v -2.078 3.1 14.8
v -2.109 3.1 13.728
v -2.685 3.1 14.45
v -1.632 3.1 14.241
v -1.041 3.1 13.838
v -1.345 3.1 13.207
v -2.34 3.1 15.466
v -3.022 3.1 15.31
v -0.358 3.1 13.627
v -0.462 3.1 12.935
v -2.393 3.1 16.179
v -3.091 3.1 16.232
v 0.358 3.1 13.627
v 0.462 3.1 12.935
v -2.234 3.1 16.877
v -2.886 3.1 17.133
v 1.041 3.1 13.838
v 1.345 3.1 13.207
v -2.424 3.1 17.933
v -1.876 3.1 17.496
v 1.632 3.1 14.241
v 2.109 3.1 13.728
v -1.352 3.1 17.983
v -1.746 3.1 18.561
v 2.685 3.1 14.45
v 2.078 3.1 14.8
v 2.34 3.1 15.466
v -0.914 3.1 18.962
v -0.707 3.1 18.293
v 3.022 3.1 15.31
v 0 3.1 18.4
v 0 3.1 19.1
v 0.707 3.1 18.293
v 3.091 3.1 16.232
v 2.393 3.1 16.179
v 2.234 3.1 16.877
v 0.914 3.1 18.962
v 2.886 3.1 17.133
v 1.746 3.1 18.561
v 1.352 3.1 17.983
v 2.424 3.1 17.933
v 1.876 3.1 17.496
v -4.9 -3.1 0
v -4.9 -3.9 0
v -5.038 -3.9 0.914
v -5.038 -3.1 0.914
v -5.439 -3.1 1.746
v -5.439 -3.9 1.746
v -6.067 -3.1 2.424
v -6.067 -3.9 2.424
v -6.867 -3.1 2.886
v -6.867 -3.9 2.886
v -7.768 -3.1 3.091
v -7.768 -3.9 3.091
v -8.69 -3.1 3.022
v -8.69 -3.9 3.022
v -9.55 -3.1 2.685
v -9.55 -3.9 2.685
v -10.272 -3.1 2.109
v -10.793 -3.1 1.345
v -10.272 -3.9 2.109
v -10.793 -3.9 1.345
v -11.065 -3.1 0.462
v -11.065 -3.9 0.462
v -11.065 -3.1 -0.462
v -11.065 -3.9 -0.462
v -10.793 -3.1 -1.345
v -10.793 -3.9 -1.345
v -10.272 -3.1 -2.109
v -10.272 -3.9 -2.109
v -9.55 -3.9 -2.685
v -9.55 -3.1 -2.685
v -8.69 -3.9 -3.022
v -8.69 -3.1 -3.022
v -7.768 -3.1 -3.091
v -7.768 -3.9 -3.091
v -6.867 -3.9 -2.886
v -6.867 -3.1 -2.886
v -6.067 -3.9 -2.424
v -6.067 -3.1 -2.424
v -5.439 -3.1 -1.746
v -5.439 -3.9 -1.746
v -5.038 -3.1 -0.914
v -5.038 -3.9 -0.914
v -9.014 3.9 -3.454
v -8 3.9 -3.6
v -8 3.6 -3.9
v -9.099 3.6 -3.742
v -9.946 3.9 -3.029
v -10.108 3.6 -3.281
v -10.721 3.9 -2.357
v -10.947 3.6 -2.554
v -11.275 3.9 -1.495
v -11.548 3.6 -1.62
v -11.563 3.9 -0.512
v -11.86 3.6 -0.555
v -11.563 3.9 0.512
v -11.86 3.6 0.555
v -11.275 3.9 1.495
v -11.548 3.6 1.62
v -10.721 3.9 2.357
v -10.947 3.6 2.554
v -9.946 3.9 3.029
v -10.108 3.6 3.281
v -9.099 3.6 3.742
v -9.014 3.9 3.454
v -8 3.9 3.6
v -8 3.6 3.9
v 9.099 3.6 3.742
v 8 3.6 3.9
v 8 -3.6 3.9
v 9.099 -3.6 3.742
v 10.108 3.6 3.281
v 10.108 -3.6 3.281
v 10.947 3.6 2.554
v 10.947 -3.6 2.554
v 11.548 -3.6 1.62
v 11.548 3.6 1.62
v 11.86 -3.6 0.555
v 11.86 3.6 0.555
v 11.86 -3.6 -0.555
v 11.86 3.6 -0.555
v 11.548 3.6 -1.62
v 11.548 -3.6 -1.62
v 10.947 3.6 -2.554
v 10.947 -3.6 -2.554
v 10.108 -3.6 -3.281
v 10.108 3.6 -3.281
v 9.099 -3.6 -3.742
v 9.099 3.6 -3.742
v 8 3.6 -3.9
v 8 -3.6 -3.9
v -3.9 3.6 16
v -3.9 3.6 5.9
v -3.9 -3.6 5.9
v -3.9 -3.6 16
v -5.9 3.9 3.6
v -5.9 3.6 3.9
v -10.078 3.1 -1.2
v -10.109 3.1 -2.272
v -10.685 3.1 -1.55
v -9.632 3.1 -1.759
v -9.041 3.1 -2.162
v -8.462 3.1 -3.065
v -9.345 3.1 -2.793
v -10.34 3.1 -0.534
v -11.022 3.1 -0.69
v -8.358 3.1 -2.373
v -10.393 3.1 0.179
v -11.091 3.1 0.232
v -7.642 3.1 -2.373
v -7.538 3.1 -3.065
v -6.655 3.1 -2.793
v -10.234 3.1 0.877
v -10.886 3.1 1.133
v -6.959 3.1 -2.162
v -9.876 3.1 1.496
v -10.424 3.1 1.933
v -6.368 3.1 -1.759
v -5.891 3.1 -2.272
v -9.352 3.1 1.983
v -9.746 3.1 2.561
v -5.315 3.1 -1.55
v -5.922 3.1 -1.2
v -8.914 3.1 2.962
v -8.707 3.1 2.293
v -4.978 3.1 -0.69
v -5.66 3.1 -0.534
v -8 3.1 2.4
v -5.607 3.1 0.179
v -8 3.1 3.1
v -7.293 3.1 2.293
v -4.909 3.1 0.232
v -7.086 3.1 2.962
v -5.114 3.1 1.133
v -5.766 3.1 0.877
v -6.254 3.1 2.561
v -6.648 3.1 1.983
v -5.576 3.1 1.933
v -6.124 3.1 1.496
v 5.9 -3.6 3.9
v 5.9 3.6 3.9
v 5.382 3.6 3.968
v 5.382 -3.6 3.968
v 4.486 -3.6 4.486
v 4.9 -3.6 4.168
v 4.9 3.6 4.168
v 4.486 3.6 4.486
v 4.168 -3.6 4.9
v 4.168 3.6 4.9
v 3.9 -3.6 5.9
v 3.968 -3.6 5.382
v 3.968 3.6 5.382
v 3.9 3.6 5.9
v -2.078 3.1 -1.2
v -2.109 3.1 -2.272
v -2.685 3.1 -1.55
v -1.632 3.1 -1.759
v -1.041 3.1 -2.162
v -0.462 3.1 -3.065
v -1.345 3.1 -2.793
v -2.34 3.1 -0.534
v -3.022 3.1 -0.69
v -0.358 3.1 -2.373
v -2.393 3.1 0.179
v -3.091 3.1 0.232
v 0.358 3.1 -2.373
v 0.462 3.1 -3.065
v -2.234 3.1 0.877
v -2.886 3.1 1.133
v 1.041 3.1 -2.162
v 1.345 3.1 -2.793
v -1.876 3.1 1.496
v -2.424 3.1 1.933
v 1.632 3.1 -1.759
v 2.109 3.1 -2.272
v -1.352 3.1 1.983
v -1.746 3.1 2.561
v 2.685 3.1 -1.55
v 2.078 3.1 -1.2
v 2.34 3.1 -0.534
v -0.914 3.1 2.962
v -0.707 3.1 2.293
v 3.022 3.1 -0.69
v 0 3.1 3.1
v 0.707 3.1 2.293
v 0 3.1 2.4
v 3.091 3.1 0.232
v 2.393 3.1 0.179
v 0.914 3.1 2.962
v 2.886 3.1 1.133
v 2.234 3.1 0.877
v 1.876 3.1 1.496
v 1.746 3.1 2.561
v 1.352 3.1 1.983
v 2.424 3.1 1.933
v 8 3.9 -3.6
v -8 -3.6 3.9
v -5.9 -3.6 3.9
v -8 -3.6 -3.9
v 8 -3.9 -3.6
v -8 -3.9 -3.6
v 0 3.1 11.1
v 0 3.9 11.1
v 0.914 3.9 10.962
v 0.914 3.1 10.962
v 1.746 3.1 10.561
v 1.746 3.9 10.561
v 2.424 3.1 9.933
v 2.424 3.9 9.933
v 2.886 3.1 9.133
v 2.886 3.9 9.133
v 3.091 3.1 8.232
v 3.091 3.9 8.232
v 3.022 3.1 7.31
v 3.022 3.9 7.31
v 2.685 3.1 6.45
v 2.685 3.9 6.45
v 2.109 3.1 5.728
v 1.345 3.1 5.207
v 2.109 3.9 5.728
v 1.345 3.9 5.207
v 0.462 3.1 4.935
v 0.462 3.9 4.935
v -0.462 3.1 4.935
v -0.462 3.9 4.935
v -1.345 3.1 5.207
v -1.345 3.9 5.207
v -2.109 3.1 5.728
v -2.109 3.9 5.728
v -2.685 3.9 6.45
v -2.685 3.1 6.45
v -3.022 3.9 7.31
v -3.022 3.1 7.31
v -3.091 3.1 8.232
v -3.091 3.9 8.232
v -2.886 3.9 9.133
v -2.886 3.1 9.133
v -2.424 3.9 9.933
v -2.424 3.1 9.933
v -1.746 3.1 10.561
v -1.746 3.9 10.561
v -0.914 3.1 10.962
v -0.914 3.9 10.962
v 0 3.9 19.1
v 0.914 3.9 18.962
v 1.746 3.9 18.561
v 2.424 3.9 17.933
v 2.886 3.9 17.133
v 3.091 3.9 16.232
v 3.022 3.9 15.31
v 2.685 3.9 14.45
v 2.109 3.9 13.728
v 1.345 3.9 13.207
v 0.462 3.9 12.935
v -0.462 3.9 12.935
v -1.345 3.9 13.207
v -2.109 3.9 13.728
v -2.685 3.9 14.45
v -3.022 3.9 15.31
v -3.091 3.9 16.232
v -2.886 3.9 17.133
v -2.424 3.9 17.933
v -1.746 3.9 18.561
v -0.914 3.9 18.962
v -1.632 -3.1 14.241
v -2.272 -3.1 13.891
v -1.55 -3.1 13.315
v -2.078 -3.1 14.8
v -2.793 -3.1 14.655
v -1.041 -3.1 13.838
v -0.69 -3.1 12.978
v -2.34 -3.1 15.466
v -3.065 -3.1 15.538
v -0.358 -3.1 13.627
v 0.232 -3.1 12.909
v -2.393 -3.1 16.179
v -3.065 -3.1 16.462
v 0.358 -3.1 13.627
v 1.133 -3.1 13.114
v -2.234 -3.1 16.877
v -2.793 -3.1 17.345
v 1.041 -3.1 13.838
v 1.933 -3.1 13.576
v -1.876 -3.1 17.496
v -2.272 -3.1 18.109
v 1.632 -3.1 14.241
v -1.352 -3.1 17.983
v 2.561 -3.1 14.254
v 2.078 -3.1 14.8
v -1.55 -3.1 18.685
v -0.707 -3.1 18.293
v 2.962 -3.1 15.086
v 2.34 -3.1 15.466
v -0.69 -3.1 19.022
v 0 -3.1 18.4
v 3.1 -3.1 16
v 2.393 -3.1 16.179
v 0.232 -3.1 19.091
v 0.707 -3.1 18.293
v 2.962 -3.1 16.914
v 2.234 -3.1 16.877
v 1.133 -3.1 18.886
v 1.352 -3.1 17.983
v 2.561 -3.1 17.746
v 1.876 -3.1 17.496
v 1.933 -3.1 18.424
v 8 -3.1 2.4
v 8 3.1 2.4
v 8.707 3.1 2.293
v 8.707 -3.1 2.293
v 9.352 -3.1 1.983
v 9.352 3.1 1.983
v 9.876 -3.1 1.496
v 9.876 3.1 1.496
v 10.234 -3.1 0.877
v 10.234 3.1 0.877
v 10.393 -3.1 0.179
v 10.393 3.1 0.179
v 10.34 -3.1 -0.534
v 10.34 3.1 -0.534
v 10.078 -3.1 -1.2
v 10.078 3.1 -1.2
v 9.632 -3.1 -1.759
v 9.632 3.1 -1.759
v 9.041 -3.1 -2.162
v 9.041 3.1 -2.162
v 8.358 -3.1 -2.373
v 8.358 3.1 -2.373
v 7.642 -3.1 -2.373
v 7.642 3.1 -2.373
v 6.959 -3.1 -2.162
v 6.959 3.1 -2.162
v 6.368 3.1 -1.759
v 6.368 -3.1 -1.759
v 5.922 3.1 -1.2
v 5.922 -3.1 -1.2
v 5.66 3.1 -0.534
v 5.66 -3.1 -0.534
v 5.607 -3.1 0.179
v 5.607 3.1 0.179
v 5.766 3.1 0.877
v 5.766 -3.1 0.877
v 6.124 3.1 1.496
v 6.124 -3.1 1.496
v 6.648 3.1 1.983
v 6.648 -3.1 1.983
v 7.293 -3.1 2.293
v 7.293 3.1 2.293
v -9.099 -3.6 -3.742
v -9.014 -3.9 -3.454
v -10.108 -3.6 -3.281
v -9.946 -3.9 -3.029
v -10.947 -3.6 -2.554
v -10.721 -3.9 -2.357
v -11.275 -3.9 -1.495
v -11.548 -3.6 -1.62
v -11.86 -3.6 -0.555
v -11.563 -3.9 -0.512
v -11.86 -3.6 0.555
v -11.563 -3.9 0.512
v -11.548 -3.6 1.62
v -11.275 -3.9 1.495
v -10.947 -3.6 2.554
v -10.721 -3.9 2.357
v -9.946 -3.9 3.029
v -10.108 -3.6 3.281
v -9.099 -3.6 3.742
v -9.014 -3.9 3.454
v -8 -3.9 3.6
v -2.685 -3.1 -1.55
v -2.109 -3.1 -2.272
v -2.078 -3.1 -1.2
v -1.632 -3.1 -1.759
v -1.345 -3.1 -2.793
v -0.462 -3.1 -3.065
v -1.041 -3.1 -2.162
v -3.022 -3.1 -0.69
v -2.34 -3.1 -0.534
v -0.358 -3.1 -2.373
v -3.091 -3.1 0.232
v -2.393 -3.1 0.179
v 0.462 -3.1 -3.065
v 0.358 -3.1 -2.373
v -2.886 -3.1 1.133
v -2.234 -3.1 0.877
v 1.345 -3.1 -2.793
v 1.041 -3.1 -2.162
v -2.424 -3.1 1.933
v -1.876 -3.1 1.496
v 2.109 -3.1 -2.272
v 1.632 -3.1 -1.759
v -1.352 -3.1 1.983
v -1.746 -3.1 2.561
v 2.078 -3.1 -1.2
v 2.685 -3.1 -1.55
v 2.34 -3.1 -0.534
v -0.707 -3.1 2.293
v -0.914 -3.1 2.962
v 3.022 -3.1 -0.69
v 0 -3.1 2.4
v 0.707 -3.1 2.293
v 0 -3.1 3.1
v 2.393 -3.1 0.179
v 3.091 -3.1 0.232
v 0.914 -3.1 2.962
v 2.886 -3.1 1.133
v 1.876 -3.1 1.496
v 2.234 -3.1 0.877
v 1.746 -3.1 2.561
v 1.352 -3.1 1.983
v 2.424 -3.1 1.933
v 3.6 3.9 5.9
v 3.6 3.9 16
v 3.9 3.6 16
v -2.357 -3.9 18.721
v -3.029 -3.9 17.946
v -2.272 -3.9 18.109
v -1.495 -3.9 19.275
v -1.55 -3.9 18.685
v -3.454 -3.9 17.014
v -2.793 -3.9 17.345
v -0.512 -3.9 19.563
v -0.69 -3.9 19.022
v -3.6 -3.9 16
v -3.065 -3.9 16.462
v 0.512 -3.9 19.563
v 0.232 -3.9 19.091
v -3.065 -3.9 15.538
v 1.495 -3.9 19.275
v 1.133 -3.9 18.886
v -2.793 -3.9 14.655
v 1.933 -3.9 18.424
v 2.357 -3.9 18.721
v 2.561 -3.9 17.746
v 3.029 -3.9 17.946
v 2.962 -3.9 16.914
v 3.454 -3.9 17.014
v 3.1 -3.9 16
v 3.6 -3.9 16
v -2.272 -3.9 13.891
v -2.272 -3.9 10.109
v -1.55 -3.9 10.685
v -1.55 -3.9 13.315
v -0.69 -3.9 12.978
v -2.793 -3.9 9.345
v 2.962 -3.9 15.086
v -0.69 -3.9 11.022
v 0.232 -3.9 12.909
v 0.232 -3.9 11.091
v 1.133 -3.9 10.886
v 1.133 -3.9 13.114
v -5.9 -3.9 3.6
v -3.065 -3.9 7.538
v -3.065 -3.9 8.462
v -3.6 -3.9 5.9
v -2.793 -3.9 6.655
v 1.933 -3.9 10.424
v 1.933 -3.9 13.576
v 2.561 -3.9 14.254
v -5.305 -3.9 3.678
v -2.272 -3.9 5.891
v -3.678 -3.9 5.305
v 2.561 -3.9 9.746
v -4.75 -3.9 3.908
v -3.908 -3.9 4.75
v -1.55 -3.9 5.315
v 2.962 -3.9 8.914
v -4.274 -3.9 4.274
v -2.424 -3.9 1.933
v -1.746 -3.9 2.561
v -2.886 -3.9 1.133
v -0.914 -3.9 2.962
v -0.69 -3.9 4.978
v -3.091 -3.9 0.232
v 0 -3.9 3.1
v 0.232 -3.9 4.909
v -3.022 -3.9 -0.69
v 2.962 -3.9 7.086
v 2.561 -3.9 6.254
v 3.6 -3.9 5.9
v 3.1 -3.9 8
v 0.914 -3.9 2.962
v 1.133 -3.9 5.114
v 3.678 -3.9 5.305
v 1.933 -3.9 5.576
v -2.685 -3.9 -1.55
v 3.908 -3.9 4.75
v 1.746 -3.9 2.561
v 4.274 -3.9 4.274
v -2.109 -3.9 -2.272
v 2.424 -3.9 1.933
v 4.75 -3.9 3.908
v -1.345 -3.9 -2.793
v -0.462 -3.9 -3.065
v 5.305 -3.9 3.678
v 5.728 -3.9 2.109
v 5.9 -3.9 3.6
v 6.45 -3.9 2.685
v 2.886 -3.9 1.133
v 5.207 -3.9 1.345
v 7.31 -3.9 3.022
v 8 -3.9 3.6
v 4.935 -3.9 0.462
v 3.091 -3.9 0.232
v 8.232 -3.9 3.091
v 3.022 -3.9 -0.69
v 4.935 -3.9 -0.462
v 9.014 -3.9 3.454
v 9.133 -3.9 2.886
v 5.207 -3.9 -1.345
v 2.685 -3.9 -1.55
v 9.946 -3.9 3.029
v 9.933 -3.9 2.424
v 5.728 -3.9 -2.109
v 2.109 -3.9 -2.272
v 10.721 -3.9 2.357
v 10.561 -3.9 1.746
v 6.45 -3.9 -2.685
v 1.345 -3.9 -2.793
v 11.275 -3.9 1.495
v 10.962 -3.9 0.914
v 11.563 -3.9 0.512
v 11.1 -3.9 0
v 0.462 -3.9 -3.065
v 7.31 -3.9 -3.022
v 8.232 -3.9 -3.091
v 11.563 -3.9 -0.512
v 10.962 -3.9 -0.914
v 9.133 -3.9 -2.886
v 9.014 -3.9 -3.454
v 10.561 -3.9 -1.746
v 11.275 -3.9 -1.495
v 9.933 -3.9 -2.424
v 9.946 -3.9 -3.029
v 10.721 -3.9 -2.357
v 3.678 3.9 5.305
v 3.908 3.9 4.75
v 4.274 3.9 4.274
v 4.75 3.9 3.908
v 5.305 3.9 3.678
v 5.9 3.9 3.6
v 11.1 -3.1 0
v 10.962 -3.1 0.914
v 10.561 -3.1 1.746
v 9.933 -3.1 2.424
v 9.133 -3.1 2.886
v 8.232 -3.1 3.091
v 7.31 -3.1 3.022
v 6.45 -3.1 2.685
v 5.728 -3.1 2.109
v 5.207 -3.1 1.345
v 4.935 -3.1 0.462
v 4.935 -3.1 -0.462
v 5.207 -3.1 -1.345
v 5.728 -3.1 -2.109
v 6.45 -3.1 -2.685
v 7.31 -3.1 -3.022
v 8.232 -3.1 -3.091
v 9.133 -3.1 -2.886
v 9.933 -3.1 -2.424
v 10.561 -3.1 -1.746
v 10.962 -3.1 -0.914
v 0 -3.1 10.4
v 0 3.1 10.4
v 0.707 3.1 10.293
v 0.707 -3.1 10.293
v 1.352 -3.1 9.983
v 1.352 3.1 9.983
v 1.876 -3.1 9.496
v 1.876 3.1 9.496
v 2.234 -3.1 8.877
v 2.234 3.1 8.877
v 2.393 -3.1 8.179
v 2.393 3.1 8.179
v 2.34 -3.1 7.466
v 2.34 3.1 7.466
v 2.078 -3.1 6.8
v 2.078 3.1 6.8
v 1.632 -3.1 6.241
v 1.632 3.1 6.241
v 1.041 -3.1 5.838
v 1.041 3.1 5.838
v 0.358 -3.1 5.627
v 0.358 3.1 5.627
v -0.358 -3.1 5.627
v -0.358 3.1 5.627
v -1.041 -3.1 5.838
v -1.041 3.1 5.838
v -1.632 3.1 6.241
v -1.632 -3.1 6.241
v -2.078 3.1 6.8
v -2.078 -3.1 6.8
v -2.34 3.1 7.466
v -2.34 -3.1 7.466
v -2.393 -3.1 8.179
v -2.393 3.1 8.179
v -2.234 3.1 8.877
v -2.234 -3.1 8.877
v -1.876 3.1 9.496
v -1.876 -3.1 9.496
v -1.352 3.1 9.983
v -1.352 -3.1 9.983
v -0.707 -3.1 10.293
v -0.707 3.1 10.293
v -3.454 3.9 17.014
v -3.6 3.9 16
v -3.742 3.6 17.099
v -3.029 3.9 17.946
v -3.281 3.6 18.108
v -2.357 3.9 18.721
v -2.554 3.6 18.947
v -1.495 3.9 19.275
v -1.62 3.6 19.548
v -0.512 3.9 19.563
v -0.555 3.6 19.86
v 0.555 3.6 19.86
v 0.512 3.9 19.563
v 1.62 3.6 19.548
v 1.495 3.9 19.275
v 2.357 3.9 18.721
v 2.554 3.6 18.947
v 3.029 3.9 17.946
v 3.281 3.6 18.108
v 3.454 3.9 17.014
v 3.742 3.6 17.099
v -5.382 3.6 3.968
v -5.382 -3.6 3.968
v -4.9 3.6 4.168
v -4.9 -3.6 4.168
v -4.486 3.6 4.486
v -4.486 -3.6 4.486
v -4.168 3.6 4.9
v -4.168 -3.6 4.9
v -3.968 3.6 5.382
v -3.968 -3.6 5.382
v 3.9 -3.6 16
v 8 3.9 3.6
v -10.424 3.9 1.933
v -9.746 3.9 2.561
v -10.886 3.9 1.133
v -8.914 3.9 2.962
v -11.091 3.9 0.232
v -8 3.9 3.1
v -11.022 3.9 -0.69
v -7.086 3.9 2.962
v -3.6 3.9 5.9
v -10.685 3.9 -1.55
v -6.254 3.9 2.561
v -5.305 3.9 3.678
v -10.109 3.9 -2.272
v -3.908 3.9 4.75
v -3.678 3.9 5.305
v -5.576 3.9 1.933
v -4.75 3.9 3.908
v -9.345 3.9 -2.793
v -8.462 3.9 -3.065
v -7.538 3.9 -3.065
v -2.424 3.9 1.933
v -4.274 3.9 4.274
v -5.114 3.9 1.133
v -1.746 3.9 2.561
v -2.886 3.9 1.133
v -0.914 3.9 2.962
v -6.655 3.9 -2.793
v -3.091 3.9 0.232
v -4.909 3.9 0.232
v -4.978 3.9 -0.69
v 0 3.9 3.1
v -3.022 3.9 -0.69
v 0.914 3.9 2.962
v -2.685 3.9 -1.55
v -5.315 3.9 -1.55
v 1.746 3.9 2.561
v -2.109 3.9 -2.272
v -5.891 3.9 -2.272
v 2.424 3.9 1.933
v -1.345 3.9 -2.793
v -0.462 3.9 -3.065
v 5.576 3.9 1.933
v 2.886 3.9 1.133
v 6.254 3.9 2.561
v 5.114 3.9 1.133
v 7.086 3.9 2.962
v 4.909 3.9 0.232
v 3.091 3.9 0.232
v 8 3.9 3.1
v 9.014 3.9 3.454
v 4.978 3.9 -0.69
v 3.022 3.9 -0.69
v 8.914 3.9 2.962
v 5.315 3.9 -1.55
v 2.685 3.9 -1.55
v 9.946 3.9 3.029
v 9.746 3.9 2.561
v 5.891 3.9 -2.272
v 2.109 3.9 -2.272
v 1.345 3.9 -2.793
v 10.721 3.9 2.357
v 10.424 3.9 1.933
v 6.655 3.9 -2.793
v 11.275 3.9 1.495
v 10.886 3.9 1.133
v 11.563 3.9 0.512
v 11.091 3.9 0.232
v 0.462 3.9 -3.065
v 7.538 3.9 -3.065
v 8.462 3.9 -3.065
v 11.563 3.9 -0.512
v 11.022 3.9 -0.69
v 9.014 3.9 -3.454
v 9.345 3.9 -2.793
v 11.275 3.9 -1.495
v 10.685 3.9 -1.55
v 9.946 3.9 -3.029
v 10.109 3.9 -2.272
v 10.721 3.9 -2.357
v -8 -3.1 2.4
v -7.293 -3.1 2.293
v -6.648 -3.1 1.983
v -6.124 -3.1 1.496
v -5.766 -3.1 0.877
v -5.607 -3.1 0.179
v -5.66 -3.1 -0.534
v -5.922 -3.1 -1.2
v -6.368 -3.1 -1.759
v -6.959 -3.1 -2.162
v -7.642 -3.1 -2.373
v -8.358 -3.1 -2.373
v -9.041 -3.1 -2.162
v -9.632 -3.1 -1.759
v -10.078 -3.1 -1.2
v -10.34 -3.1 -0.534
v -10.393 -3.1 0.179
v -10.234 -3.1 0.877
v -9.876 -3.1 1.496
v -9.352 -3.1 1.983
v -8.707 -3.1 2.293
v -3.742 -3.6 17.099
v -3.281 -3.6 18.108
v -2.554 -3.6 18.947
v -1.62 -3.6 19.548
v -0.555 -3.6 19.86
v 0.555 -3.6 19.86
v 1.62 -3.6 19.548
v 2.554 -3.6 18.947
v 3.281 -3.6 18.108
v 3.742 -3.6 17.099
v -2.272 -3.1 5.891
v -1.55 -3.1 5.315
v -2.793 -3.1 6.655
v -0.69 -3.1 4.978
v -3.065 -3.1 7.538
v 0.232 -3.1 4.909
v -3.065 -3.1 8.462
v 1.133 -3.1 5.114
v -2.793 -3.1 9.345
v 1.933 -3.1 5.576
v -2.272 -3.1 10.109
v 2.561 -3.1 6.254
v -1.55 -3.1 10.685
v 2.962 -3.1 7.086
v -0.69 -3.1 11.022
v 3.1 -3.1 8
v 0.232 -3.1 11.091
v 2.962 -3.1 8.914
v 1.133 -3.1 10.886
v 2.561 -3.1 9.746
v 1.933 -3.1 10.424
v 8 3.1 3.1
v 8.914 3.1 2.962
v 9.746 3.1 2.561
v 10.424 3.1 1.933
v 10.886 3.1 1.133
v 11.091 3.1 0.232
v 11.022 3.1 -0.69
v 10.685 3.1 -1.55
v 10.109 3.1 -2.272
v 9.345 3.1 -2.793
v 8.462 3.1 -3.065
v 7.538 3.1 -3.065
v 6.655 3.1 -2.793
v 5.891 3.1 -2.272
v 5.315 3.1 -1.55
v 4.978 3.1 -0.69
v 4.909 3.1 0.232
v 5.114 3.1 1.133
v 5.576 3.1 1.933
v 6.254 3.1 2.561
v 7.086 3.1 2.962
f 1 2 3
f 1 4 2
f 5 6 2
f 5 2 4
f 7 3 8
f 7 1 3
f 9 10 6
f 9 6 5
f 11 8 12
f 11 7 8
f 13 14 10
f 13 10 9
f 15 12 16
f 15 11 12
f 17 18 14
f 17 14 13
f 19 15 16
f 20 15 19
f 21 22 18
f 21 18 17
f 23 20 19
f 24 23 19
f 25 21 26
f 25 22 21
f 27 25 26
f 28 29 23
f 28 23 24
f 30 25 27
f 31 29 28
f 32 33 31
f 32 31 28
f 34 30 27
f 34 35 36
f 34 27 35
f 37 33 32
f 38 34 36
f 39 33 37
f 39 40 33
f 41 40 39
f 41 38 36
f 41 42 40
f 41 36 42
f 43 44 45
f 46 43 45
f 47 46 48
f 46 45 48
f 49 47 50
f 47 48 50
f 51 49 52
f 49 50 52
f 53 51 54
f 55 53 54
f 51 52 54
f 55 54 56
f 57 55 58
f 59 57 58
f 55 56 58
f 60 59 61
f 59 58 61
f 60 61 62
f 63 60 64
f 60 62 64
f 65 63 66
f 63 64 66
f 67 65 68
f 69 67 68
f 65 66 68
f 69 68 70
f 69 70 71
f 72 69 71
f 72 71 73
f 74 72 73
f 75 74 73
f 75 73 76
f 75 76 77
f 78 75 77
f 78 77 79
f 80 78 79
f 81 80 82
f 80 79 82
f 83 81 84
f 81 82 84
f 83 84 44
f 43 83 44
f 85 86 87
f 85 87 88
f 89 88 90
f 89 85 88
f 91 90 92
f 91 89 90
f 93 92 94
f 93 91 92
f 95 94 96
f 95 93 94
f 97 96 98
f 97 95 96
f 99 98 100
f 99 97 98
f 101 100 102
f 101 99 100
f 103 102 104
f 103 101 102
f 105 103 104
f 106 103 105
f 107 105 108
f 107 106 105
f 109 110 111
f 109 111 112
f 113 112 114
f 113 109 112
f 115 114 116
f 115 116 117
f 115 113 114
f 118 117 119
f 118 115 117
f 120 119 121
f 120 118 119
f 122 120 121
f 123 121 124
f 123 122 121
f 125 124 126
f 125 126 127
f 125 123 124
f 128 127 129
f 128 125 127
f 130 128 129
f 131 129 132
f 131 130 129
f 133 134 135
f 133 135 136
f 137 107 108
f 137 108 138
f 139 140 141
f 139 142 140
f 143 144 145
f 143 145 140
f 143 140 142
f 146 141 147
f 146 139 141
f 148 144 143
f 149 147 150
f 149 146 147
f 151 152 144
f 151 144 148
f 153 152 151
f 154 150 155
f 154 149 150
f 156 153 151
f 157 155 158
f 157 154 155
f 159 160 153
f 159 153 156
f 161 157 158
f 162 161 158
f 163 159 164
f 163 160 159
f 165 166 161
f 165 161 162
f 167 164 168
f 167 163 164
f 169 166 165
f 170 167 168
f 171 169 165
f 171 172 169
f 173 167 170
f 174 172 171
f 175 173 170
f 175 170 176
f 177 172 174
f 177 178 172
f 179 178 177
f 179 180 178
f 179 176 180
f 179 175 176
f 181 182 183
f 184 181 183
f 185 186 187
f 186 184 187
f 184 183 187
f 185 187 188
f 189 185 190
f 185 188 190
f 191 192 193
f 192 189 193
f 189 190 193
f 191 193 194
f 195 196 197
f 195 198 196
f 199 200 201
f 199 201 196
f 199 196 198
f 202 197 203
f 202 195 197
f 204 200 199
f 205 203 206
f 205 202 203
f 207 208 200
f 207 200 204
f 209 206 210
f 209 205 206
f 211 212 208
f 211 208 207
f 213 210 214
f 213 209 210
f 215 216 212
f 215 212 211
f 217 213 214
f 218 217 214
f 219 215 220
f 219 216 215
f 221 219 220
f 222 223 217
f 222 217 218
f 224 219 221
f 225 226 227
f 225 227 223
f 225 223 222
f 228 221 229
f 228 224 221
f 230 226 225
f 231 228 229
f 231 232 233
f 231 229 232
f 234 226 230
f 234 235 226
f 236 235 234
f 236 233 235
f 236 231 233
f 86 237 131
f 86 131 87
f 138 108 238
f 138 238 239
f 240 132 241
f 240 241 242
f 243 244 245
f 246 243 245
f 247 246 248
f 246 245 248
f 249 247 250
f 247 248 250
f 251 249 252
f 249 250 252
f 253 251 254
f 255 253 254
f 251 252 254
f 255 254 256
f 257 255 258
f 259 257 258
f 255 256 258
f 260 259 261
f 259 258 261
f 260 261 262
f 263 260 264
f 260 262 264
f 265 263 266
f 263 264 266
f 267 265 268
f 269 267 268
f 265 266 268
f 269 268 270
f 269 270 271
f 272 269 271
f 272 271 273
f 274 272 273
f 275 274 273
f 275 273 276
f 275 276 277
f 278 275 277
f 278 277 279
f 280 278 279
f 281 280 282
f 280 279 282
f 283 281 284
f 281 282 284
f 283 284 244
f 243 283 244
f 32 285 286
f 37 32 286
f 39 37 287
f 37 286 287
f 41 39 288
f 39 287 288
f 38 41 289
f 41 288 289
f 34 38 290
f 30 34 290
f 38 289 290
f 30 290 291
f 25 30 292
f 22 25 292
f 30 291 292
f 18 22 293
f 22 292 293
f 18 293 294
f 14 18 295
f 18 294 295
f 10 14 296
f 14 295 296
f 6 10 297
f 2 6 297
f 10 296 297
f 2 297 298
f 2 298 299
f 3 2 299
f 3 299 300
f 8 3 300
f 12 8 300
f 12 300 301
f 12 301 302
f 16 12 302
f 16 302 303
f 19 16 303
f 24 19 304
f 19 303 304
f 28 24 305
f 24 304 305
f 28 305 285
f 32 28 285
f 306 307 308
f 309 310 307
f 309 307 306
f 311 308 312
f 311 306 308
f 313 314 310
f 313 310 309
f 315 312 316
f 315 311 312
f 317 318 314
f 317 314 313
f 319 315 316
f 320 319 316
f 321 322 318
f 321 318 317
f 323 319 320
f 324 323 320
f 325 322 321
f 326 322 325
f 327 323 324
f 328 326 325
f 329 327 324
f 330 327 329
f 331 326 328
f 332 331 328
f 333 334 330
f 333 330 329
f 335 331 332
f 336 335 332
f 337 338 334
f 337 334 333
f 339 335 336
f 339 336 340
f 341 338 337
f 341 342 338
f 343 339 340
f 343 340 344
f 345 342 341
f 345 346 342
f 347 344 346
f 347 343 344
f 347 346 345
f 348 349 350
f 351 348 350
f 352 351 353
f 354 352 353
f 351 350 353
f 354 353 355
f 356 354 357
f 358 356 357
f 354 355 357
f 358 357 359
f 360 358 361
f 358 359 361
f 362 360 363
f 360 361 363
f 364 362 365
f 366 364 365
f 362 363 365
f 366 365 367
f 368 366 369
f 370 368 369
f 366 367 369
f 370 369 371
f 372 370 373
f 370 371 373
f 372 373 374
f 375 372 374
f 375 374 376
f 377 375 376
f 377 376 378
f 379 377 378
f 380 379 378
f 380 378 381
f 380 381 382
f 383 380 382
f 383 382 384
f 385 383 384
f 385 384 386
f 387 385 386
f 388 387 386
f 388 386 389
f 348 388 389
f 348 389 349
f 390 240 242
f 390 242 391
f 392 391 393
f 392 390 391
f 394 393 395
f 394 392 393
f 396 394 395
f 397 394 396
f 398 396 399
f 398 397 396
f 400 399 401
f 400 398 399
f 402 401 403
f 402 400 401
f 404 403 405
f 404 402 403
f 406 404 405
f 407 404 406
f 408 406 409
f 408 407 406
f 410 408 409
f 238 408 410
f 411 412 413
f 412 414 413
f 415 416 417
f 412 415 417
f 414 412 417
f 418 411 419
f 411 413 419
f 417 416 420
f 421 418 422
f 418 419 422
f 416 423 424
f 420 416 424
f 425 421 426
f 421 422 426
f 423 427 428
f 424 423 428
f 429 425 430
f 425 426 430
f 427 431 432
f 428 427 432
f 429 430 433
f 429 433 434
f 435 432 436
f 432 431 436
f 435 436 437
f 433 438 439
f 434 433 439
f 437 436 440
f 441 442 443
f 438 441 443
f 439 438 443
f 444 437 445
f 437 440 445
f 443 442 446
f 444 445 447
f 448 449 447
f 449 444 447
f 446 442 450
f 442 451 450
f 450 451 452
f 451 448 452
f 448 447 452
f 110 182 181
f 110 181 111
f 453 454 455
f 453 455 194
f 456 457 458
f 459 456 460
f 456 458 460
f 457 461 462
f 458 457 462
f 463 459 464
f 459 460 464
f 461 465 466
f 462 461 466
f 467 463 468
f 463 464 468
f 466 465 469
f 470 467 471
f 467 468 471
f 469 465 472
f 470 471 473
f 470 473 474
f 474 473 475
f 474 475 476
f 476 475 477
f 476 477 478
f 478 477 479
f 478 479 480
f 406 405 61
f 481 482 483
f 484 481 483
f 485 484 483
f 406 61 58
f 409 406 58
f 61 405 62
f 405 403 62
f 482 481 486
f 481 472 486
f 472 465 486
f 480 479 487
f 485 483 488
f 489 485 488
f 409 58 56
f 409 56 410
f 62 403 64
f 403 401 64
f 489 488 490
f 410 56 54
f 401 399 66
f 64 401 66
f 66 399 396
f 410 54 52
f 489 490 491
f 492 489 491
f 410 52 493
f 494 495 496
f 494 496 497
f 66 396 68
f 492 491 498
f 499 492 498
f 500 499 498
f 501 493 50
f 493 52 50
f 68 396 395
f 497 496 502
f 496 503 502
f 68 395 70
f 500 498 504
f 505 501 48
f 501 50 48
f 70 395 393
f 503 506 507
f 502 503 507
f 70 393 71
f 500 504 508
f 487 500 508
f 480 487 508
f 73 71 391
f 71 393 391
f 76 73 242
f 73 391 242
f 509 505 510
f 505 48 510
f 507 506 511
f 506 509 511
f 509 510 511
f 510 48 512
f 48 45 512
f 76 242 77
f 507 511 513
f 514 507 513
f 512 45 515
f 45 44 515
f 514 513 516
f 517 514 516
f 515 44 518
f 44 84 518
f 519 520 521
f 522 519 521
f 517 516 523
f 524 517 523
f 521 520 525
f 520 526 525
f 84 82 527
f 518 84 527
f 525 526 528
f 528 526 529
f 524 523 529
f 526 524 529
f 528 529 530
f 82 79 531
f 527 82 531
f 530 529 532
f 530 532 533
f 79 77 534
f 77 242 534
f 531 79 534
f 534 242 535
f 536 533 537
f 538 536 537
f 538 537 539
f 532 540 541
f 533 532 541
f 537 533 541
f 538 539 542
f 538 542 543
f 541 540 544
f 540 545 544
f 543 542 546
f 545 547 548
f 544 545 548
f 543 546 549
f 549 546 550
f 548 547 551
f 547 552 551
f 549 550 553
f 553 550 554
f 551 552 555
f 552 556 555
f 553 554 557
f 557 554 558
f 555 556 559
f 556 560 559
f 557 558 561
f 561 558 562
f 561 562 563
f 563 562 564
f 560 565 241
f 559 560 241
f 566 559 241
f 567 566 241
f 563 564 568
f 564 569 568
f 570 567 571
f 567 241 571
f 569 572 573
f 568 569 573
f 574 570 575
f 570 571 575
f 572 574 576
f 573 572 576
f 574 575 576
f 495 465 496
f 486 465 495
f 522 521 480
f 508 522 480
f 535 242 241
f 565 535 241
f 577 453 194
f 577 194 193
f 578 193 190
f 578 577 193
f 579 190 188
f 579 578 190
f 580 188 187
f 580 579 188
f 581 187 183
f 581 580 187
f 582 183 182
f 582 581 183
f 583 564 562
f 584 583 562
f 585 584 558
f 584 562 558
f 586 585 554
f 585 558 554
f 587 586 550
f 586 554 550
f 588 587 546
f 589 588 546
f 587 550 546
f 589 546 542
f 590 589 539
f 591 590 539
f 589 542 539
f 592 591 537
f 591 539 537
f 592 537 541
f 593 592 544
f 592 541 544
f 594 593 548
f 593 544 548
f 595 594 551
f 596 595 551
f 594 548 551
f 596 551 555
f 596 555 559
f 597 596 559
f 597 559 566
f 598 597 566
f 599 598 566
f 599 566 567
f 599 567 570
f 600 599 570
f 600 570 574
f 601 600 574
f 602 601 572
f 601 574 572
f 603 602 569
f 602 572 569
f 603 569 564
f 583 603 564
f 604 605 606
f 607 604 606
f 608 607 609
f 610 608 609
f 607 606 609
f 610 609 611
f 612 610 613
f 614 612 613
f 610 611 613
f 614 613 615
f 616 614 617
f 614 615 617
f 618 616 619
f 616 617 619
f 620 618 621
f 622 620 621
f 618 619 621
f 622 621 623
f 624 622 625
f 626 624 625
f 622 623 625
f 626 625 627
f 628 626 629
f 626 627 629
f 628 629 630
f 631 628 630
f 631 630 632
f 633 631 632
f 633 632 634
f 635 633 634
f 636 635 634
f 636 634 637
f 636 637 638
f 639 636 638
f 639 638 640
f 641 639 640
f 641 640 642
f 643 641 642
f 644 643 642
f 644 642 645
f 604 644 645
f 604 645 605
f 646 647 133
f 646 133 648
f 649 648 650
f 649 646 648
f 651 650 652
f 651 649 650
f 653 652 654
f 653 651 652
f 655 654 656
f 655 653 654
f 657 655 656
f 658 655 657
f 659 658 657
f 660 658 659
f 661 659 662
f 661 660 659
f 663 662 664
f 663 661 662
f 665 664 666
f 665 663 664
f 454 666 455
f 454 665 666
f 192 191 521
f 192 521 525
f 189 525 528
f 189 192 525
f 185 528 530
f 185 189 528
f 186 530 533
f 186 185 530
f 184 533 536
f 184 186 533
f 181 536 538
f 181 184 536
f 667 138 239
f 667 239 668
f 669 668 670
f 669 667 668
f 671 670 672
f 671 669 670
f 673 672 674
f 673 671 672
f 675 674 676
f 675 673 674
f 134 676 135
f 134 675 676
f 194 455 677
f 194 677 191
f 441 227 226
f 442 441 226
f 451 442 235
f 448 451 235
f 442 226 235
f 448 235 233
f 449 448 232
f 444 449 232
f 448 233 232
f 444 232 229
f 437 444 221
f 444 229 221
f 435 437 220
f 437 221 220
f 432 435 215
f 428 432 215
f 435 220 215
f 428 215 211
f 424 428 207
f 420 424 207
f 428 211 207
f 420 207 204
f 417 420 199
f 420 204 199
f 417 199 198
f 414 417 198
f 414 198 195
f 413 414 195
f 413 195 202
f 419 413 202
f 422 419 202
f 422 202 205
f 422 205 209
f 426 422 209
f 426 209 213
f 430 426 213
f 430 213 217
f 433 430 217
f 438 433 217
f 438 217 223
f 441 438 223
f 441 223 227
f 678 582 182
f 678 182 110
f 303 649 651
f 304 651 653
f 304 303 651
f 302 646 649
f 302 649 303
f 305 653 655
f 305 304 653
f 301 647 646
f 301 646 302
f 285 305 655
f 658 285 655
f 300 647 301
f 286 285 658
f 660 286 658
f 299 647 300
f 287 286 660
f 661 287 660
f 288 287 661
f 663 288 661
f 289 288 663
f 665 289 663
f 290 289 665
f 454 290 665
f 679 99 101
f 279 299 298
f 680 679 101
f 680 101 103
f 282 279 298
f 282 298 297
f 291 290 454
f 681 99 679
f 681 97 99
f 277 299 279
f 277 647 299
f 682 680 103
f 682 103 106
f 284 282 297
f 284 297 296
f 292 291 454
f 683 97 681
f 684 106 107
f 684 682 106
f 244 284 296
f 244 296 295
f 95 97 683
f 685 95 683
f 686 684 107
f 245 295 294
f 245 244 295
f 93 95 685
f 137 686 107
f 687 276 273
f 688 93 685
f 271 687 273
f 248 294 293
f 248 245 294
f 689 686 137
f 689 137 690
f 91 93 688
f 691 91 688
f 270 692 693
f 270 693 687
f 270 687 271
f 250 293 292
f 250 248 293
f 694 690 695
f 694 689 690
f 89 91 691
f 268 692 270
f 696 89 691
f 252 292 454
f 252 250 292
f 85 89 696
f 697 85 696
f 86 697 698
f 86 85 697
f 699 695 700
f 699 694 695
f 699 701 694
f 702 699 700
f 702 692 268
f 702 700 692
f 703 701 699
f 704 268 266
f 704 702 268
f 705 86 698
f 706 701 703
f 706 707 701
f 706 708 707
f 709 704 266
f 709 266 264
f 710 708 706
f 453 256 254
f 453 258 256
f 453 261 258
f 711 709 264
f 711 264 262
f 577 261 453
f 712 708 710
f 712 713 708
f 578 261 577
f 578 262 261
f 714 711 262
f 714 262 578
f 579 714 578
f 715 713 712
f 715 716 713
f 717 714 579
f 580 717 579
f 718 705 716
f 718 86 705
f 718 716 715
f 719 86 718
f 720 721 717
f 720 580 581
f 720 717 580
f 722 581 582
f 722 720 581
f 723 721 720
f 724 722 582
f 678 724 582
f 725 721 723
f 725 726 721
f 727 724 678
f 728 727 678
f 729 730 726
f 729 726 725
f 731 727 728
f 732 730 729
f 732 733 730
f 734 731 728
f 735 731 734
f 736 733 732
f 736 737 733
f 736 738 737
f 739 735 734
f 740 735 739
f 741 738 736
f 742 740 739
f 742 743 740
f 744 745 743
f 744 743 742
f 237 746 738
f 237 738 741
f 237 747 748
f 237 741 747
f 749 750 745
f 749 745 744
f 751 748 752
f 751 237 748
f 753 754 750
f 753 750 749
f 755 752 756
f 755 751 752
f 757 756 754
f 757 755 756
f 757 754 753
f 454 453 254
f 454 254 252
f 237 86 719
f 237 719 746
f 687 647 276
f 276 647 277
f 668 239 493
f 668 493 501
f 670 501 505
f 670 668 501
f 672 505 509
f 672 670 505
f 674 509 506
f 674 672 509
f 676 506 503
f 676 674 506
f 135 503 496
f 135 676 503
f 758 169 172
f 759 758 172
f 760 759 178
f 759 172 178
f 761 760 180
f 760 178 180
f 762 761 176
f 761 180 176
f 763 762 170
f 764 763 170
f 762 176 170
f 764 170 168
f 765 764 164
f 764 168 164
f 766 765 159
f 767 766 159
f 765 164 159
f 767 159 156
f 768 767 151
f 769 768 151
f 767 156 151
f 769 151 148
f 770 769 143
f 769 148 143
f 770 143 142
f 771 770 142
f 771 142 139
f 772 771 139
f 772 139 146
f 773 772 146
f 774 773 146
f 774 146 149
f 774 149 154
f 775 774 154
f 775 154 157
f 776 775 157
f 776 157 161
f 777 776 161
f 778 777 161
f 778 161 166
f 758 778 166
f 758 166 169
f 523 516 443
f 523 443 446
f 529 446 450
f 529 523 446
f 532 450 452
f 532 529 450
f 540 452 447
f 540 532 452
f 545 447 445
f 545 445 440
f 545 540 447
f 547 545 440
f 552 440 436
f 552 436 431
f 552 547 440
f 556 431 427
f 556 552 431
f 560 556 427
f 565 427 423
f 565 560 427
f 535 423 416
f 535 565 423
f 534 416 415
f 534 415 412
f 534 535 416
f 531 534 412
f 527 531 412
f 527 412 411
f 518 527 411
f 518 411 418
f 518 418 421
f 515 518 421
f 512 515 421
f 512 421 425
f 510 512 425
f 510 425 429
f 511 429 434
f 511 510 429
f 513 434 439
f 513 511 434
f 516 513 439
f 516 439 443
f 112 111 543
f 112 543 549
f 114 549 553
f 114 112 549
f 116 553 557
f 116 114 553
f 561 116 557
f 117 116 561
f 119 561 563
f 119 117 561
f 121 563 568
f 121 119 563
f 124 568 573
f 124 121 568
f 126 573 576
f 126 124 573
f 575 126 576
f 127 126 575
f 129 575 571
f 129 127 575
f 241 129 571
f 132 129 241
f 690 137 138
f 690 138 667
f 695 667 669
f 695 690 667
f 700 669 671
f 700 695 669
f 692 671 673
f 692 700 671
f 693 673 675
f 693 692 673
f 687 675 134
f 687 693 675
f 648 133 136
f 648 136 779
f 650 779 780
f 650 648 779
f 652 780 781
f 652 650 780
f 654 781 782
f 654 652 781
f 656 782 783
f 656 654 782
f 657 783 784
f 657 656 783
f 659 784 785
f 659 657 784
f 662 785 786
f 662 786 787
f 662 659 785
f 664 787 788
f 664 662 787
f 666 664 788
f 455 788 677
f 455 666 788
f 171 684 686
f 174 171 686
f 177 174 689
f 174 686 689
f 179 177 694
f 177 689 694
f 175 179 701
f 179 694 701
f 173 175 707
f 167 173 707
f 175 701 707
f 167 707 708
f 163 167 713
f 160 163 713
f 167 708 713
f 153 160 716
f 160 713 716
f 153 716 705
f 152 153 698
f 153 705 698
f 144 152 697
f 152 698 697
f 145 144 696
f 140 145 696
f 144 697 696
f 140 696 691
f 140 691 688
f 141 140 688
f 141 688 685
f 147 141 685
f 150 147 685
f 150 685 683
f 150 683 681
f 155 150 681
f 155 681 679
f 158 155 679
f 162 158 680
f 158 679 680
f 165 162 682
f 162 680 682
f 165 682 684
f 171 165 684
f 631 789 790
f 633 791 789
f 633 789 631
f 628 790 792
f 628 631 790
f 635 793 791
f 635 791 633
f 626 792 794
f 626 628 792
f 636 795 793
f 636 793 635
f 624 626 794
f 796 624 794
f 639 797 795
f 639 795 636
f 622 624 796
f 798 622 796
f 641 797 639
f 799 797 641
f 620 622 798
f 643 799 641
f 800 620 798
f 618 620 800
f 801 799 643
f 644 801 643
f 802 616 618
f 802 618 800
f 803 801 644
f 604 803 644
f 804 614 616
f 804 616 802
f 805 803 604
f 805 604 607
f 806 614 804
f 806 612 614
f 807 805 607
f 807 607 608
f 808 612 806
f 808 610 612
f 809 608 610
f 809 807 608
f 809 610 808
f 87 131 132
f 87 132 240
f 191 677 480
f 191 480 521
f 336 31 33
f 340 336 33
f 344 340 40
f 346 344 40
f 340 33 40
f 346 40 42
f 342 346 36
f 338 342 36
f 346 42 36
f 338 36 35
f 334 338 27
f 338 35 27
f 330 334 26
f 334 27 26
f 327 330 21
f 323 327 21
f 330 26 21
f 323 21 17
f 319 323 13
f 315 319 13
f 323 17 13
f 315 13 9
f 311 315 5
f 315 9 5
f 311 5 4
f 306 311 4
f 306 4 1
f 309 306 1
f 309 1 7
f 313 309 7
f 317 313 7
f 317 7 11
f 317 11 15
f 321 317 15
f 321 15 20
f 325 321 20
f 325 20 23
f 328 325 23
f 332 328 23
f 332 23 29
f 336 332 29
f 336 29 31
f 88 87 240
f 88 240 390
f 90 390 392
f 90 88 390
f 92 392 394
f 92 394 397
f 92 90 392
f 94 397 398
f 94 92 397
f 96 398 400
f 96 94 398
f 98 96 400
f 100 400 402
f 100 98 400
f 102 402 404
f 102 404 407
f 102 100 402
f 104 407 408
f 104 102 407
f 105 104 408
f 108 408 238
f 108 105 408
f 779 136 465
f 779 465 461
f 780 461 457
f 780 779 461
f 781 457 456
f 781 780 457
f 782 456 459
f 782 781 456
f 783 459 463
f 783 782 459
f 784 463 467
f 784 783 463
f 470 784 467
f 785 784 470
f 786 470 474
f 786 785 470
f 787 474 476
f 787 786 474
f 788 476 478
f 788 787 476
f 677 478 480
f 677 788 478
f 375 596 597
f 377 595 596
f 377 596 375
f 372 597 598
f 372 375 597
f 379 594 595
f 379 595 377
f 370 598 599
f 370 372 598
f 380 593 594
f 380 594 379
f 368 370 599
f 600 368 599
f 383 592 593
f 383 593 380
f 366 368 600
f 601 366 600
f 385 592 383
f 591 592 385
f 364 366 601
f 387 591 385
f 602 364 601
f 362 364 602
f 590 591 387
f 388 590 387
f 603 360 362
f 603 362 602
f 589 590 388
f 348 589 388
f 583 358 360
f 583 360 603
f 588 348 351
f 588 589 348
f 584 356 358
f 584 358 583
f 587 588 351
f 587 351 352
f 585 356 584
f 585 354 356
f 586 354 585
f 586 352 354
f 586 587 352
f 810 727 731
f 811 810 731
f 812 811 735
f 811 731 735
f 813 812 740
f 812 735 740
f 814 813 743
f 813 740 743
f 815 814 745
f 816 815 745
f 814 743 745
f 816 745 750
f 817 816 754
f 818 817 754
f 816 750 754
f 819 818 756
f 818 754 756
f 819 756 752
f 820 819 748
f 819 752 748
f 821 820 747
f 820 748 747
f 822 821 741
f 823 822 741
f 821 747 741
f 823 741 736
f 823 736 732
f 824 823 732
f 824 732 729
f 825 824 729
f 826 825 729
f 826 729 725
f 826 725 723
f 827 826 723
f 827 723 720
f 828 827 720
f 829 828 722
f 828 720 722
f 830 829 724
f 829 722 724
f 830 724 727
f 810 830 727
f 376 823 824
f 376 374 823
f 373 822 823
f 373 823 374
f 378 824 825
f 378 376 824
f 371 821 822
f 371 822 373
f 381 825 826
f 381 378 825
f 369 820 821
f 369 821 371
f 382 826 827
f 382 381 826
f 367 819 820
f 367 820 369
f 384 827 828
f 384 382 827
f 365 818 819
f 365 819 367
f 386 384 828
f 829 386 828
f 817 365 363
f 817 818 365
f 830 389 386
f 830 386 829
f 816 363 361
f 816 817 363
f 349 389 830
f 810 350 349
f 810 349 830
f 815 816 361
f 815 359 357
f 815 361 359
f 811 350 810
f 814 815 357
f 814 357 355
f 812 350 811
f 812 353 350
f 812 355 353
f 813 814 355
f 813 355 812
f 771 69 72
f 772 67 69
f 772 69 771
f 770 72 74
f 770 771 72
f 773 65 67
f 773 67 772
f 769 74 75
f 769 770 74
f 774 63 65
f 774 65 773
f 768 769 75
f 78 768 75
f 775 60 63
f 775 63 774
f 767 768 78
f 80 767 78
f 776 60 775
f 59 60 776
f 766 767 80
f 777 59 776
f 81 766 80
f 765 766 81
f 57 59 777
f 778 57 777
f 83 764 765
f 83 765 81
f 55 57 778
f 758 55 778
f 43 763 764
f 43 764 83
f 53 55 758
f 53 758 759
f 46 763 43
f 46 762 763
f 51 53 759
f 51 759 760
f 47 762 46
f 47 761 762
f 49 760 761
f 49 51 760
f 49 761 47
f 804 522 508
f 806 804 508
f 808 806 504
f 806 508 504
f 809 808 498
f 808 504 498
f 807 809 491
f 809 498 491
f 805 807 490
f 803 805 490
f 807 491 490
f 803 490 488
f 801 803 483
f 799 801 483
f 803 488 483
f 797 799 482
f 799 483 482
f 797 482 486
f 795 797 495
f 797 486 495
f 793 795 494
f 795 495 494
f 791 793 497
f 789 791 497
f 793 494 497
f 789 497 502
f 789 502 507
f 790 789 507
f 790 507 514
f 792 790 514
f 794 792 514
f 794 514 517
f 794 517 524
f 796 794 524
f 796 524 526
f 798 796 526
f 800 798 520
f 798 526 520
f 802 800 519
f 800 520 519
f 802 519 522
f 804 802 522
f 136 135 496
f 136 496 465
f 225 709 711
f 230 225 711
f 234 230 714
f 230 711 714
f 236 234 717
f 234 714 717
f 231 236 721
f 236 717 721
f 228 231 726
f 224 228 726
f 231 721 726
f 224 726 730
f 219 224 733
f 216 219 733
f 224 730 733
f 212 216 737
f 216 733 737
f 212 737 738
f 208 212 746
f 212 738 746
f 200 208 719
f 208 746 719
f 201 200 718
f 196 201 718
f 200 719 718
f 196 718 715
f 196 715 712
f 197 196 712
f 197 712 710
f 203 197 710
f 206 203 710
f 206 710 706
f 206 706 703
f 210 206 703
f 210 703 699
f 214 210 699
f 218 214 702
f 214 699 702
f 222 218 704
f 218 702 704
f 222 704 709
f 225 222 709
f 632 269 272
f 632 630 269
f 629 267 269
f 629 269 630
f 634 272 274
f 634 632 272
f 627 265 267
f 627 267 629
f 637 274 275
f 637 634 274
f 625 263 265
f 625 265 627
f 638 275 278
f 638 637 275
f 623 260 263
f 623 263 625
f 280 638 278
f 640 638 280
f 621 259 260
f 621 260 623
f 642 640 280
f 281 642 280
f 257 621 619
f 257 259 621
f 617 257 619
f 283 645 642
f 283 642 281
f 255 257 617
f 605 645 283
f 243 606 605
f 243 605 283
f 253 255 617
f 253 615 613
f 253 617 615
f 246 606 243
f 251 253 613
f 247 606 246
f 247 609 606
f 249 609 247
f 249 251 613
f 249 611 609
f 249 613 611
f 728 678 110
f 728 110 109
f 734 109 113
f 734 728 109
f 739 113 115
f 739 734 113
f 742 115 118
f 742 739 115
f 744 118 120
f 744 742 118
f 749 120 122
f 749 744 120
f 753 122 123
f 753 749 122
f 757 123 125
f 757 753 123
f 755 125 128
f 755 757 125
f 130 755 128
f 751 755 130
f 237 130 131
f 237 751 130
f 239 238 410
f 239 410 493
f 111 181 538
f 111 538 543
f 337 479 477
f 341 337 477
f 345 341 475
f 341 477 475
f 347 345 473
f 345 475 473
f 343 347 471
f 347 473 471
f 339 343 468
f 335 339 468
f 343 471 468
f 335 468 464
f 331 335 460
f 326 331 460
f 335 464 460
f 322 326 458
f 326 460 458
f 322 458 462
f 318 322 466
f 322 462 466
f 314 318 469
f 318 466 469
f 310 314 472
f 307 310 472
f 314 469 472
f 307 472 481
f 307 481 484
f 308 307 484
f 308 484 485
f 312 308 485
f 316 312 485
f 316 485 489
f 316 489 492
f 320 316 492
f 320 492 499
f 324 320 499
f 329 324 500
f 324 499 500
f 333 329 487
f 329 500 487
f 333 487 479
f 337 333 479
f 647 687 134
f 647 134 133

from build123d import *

# Parameters (mm, degrees)
BOSS_EXTRUDE1_DEPTH           = 3.9
SKETCH2_R                     = 2.4
CUT_EXTRUDE1_DEPTH            = 25.463442113
SKETCH3_R                     = 3.1
CUT_EXTRUDE2_DEPTH            = 0.8
LPATTERN1_COUNT               = 2
LPATTERN1_PITCH               = 8
LPATTERN1_COPY_1_SKETCH_R     = 3.1
LPATTERN1_COPY_1_DEPTH        = 0.8
LPATTERN1_COL_COUNT           = 2
LPATTERN1_COL_PITCH           = 8
LPATTERN1_COL_COPY_1_SKETCH_R = 3.1
LPATTERN1_COL_COPY_1_DEPTH    = 0.8
LPATTERN2_COUNT               = 3
LPATTERN2_PITCH               = 8
LPATTERN2_COPY_1_SKETCH_R     = 3.1
LPATTERN2_COPY_1_DEPTH        = 0.8
LPATTERN2_COPY_2_SKETCH_R     = 3.1
LPATTERN2_COPY_2_DEPTH        = 0.8
FILLET1_R                     = 2
CHAMFER1_SIZE                 = 0.3


with BuildPart() as part:
    # Sketch1 → Boss-Extrude1 (new, symmetric)
    with BuildSketch(Plane(origin=(0, 0, 0), x_dir=(1, 0, 0), z_dir=(0, 1, 0))):
        with BuildLine():
            Line((-8, -3.9), (8, -3.9))
            ThreePointArc((8, -3.9), (11.9, 0), (8, 3.9))
            Line((8, 3.9), (-8, 3.9))
            ThreePointArc((-8, 3.9), (-11.9, 0), (-8, -3.9))
        make_face()
        with BuildLine():
            Line((-3.9, 0), (-3.9, -16))
            ThreePointArc((-3.9, -16), (0, -19.9), (3.9, -16))
            Line((3.9, -16), (3.9, 0))
            ThreePointArc((3.9, 0), (0, 3.9), (-3.9, 0))
        make_face()
    extrude(amount=BOSS_EXTRUDE1_DEPTH, both=True)

    # Sketch2 → Cut-Extrude1 (cut, through all)
    with BuildSketch(Plane(origin=(0, 3.9, 0), x_dir=(1, 0, 0), z_dir=(0, 1, 0))):
        with Locations(Location((0, 0, 0), (0, 0, 270))):
            Circle(SKETCH2_R)
    cut_extrude1 = extrude(amount=-CUT_EXTRUDE1_DEPTH, mode=Mode.SUBTRACT)

    # Sketch3 → Cut-Extrude2 (cut)
    with BuildSketch(Plane(origin=(0, 3.9, 0), x_dir=(1, 0, 0), z_dir=(0, 1, 0))):
        with Locations(Location((0, 0, 0), (0, 0, 270))):
            Circle(SKETCH3_R)
    cut_extrude2 = extrude(amount=-CUT_EXTRUDE2_DEPTH, mode=Mode.SUBTRACT)

    # Mirror1: Cut-Extrude2 across plane
    add(cut_extrude2.mirror(Plane.ZX), mode=Mode.SUBTRACT)

    # LPattern1: Cut-Extrude1, Cut-Extrude2 ×2
    with Locations(*[(-i * LPATTERN1_PITCH, 0, 0) for i in range(1, LPATTERN1_COUNT)]):
        add(cut_extrude1, mode=Mode.SUBTRACT)
        add(cut_extrude2, mode=Mode.SUBTRACT)

    # LPattern1 copy 1 sketch → LPattern1 copy 1 (cut)
    with BuildSketch(Plane(origin=(-8, -3.9, 0), x_dir=(1, 0, 0), z_dir=(0, -1, 0))):
        Circle(LPATTERN1_COPY_1_SKETCH_R)
    extrude(amount=-LPATTERN1_COPY_1_DEPTH, mode=Mode.SUBTRACT)

    # LPattern1 col: Cut-Extrude1, Cut-Extrude2 ×2
    with Locations(*[(i * LPATTERN1_COL_PITCH, 0, 0) for i in range(1, LPATTERN1_COL_COUNT)]):
        add(cut_extrude1, mode=Mode.SUBTRACT)
        add(cut_extrude2, mode=Mode.SUBTRACT)

    # LPattern1 col copy 1 sketch → LPattern1 col copy 1 (cut)
    with BuildSketch(Plane(origin=(8, -3.9, 0), x_dir=(1, 0, 0), z_dir=(0, -1, 0))):
        Circle(LPATTERN1_COL_COPY_1_SKETCH_R)
    extrude(amount=-LPATTERN1_COL_COPY_1_DEPTH, mode=Mode.SUBTRACT)

    # LPattern2: Cut-Extrude1, Cut-Extrude2 ×3
    with Locations(*[(0, 0, i * LPATTERN2_PITCH) for i in range(1, LPATTERN2_COUNT)]):
        add(cut_extrude1, mode=Mode.SUBTRACT)
        add(cut_extrude2, mode=Mode.SUBTRACT)

    # LPattern2 copy 1 sketch → LPattern2 copy 1 (cut)
    with BuildSketch(Plane(origin=(0, -3.9, 8), x_dir=(1, 0, 0), z_dir=(0, -1, 0))):
        Circle(LPATTERN2_COPY_1_SKETCH_R)
    extrude(amount=-LPATTERN2_COPY_1_DEPTH, mode=Mode.SUBTRACT)

    # LPattern2 copy 2 sketch → LPattern2 copy 2 (cut)
    with BuildSketch(Plane(origin=(0, -3.9, 16), x_dir=(1, 0, 0), z_dir=(0, -1, 0))):
        Circle(LPATTERN2_COPY_2_SKETCH_R)
    extrude(amount=-LPATTERN2_COPY_2_DEPTH, mode=Mode.SUBTRACT)

    # Fillet1
    fillet1_edges = [part.edges().sort_by_distance(p)[0] for p in [
        (3.9, 0, 3.9),
        (-3.9, 0, 3.9),
    ]]
    fillet(fillet1_edges, radius=FILLET1_R)

    # Chamfer1
    chamfer1_edges = [part.edges().sort_by_distance(p)[0] for p in [
        (0, 3.9, 19.9),
        (-3.9, -3.9, 10.95),
        (-3.9, 3.9, 10.95),
        (3.9, -3.9, 10.95),
        (3.9, 3.9, 10.95),
        (6.95, -3.9, 3.9),
        (6.95, 3.9, 3.9),
        (-4.485786438, 3.9, 4.485786438),
        (-4.485786438, -3.9, 4.485786438),
        (4.485786438, 3.9, 4.485786438),
        (4.485786438, -3.9, 4.485786438),
        (-6.95, 3.9, 3.9),
        (11.9, 3.9, 0),
        (0, 3.9, -3.9),
        (-11.9, 3.9, 0),
        (-6.95, -3.9, 3.9),
        (11.9, -3.9, 0),
        (0, -3.9, -3.9),
        (-11.9, -3.9, 0),
        (0, -3.9, 19.9),
    ]]
    chamfer(chamfer1_edges, length=CHAMFER1_SIZE)


solid = part.part
